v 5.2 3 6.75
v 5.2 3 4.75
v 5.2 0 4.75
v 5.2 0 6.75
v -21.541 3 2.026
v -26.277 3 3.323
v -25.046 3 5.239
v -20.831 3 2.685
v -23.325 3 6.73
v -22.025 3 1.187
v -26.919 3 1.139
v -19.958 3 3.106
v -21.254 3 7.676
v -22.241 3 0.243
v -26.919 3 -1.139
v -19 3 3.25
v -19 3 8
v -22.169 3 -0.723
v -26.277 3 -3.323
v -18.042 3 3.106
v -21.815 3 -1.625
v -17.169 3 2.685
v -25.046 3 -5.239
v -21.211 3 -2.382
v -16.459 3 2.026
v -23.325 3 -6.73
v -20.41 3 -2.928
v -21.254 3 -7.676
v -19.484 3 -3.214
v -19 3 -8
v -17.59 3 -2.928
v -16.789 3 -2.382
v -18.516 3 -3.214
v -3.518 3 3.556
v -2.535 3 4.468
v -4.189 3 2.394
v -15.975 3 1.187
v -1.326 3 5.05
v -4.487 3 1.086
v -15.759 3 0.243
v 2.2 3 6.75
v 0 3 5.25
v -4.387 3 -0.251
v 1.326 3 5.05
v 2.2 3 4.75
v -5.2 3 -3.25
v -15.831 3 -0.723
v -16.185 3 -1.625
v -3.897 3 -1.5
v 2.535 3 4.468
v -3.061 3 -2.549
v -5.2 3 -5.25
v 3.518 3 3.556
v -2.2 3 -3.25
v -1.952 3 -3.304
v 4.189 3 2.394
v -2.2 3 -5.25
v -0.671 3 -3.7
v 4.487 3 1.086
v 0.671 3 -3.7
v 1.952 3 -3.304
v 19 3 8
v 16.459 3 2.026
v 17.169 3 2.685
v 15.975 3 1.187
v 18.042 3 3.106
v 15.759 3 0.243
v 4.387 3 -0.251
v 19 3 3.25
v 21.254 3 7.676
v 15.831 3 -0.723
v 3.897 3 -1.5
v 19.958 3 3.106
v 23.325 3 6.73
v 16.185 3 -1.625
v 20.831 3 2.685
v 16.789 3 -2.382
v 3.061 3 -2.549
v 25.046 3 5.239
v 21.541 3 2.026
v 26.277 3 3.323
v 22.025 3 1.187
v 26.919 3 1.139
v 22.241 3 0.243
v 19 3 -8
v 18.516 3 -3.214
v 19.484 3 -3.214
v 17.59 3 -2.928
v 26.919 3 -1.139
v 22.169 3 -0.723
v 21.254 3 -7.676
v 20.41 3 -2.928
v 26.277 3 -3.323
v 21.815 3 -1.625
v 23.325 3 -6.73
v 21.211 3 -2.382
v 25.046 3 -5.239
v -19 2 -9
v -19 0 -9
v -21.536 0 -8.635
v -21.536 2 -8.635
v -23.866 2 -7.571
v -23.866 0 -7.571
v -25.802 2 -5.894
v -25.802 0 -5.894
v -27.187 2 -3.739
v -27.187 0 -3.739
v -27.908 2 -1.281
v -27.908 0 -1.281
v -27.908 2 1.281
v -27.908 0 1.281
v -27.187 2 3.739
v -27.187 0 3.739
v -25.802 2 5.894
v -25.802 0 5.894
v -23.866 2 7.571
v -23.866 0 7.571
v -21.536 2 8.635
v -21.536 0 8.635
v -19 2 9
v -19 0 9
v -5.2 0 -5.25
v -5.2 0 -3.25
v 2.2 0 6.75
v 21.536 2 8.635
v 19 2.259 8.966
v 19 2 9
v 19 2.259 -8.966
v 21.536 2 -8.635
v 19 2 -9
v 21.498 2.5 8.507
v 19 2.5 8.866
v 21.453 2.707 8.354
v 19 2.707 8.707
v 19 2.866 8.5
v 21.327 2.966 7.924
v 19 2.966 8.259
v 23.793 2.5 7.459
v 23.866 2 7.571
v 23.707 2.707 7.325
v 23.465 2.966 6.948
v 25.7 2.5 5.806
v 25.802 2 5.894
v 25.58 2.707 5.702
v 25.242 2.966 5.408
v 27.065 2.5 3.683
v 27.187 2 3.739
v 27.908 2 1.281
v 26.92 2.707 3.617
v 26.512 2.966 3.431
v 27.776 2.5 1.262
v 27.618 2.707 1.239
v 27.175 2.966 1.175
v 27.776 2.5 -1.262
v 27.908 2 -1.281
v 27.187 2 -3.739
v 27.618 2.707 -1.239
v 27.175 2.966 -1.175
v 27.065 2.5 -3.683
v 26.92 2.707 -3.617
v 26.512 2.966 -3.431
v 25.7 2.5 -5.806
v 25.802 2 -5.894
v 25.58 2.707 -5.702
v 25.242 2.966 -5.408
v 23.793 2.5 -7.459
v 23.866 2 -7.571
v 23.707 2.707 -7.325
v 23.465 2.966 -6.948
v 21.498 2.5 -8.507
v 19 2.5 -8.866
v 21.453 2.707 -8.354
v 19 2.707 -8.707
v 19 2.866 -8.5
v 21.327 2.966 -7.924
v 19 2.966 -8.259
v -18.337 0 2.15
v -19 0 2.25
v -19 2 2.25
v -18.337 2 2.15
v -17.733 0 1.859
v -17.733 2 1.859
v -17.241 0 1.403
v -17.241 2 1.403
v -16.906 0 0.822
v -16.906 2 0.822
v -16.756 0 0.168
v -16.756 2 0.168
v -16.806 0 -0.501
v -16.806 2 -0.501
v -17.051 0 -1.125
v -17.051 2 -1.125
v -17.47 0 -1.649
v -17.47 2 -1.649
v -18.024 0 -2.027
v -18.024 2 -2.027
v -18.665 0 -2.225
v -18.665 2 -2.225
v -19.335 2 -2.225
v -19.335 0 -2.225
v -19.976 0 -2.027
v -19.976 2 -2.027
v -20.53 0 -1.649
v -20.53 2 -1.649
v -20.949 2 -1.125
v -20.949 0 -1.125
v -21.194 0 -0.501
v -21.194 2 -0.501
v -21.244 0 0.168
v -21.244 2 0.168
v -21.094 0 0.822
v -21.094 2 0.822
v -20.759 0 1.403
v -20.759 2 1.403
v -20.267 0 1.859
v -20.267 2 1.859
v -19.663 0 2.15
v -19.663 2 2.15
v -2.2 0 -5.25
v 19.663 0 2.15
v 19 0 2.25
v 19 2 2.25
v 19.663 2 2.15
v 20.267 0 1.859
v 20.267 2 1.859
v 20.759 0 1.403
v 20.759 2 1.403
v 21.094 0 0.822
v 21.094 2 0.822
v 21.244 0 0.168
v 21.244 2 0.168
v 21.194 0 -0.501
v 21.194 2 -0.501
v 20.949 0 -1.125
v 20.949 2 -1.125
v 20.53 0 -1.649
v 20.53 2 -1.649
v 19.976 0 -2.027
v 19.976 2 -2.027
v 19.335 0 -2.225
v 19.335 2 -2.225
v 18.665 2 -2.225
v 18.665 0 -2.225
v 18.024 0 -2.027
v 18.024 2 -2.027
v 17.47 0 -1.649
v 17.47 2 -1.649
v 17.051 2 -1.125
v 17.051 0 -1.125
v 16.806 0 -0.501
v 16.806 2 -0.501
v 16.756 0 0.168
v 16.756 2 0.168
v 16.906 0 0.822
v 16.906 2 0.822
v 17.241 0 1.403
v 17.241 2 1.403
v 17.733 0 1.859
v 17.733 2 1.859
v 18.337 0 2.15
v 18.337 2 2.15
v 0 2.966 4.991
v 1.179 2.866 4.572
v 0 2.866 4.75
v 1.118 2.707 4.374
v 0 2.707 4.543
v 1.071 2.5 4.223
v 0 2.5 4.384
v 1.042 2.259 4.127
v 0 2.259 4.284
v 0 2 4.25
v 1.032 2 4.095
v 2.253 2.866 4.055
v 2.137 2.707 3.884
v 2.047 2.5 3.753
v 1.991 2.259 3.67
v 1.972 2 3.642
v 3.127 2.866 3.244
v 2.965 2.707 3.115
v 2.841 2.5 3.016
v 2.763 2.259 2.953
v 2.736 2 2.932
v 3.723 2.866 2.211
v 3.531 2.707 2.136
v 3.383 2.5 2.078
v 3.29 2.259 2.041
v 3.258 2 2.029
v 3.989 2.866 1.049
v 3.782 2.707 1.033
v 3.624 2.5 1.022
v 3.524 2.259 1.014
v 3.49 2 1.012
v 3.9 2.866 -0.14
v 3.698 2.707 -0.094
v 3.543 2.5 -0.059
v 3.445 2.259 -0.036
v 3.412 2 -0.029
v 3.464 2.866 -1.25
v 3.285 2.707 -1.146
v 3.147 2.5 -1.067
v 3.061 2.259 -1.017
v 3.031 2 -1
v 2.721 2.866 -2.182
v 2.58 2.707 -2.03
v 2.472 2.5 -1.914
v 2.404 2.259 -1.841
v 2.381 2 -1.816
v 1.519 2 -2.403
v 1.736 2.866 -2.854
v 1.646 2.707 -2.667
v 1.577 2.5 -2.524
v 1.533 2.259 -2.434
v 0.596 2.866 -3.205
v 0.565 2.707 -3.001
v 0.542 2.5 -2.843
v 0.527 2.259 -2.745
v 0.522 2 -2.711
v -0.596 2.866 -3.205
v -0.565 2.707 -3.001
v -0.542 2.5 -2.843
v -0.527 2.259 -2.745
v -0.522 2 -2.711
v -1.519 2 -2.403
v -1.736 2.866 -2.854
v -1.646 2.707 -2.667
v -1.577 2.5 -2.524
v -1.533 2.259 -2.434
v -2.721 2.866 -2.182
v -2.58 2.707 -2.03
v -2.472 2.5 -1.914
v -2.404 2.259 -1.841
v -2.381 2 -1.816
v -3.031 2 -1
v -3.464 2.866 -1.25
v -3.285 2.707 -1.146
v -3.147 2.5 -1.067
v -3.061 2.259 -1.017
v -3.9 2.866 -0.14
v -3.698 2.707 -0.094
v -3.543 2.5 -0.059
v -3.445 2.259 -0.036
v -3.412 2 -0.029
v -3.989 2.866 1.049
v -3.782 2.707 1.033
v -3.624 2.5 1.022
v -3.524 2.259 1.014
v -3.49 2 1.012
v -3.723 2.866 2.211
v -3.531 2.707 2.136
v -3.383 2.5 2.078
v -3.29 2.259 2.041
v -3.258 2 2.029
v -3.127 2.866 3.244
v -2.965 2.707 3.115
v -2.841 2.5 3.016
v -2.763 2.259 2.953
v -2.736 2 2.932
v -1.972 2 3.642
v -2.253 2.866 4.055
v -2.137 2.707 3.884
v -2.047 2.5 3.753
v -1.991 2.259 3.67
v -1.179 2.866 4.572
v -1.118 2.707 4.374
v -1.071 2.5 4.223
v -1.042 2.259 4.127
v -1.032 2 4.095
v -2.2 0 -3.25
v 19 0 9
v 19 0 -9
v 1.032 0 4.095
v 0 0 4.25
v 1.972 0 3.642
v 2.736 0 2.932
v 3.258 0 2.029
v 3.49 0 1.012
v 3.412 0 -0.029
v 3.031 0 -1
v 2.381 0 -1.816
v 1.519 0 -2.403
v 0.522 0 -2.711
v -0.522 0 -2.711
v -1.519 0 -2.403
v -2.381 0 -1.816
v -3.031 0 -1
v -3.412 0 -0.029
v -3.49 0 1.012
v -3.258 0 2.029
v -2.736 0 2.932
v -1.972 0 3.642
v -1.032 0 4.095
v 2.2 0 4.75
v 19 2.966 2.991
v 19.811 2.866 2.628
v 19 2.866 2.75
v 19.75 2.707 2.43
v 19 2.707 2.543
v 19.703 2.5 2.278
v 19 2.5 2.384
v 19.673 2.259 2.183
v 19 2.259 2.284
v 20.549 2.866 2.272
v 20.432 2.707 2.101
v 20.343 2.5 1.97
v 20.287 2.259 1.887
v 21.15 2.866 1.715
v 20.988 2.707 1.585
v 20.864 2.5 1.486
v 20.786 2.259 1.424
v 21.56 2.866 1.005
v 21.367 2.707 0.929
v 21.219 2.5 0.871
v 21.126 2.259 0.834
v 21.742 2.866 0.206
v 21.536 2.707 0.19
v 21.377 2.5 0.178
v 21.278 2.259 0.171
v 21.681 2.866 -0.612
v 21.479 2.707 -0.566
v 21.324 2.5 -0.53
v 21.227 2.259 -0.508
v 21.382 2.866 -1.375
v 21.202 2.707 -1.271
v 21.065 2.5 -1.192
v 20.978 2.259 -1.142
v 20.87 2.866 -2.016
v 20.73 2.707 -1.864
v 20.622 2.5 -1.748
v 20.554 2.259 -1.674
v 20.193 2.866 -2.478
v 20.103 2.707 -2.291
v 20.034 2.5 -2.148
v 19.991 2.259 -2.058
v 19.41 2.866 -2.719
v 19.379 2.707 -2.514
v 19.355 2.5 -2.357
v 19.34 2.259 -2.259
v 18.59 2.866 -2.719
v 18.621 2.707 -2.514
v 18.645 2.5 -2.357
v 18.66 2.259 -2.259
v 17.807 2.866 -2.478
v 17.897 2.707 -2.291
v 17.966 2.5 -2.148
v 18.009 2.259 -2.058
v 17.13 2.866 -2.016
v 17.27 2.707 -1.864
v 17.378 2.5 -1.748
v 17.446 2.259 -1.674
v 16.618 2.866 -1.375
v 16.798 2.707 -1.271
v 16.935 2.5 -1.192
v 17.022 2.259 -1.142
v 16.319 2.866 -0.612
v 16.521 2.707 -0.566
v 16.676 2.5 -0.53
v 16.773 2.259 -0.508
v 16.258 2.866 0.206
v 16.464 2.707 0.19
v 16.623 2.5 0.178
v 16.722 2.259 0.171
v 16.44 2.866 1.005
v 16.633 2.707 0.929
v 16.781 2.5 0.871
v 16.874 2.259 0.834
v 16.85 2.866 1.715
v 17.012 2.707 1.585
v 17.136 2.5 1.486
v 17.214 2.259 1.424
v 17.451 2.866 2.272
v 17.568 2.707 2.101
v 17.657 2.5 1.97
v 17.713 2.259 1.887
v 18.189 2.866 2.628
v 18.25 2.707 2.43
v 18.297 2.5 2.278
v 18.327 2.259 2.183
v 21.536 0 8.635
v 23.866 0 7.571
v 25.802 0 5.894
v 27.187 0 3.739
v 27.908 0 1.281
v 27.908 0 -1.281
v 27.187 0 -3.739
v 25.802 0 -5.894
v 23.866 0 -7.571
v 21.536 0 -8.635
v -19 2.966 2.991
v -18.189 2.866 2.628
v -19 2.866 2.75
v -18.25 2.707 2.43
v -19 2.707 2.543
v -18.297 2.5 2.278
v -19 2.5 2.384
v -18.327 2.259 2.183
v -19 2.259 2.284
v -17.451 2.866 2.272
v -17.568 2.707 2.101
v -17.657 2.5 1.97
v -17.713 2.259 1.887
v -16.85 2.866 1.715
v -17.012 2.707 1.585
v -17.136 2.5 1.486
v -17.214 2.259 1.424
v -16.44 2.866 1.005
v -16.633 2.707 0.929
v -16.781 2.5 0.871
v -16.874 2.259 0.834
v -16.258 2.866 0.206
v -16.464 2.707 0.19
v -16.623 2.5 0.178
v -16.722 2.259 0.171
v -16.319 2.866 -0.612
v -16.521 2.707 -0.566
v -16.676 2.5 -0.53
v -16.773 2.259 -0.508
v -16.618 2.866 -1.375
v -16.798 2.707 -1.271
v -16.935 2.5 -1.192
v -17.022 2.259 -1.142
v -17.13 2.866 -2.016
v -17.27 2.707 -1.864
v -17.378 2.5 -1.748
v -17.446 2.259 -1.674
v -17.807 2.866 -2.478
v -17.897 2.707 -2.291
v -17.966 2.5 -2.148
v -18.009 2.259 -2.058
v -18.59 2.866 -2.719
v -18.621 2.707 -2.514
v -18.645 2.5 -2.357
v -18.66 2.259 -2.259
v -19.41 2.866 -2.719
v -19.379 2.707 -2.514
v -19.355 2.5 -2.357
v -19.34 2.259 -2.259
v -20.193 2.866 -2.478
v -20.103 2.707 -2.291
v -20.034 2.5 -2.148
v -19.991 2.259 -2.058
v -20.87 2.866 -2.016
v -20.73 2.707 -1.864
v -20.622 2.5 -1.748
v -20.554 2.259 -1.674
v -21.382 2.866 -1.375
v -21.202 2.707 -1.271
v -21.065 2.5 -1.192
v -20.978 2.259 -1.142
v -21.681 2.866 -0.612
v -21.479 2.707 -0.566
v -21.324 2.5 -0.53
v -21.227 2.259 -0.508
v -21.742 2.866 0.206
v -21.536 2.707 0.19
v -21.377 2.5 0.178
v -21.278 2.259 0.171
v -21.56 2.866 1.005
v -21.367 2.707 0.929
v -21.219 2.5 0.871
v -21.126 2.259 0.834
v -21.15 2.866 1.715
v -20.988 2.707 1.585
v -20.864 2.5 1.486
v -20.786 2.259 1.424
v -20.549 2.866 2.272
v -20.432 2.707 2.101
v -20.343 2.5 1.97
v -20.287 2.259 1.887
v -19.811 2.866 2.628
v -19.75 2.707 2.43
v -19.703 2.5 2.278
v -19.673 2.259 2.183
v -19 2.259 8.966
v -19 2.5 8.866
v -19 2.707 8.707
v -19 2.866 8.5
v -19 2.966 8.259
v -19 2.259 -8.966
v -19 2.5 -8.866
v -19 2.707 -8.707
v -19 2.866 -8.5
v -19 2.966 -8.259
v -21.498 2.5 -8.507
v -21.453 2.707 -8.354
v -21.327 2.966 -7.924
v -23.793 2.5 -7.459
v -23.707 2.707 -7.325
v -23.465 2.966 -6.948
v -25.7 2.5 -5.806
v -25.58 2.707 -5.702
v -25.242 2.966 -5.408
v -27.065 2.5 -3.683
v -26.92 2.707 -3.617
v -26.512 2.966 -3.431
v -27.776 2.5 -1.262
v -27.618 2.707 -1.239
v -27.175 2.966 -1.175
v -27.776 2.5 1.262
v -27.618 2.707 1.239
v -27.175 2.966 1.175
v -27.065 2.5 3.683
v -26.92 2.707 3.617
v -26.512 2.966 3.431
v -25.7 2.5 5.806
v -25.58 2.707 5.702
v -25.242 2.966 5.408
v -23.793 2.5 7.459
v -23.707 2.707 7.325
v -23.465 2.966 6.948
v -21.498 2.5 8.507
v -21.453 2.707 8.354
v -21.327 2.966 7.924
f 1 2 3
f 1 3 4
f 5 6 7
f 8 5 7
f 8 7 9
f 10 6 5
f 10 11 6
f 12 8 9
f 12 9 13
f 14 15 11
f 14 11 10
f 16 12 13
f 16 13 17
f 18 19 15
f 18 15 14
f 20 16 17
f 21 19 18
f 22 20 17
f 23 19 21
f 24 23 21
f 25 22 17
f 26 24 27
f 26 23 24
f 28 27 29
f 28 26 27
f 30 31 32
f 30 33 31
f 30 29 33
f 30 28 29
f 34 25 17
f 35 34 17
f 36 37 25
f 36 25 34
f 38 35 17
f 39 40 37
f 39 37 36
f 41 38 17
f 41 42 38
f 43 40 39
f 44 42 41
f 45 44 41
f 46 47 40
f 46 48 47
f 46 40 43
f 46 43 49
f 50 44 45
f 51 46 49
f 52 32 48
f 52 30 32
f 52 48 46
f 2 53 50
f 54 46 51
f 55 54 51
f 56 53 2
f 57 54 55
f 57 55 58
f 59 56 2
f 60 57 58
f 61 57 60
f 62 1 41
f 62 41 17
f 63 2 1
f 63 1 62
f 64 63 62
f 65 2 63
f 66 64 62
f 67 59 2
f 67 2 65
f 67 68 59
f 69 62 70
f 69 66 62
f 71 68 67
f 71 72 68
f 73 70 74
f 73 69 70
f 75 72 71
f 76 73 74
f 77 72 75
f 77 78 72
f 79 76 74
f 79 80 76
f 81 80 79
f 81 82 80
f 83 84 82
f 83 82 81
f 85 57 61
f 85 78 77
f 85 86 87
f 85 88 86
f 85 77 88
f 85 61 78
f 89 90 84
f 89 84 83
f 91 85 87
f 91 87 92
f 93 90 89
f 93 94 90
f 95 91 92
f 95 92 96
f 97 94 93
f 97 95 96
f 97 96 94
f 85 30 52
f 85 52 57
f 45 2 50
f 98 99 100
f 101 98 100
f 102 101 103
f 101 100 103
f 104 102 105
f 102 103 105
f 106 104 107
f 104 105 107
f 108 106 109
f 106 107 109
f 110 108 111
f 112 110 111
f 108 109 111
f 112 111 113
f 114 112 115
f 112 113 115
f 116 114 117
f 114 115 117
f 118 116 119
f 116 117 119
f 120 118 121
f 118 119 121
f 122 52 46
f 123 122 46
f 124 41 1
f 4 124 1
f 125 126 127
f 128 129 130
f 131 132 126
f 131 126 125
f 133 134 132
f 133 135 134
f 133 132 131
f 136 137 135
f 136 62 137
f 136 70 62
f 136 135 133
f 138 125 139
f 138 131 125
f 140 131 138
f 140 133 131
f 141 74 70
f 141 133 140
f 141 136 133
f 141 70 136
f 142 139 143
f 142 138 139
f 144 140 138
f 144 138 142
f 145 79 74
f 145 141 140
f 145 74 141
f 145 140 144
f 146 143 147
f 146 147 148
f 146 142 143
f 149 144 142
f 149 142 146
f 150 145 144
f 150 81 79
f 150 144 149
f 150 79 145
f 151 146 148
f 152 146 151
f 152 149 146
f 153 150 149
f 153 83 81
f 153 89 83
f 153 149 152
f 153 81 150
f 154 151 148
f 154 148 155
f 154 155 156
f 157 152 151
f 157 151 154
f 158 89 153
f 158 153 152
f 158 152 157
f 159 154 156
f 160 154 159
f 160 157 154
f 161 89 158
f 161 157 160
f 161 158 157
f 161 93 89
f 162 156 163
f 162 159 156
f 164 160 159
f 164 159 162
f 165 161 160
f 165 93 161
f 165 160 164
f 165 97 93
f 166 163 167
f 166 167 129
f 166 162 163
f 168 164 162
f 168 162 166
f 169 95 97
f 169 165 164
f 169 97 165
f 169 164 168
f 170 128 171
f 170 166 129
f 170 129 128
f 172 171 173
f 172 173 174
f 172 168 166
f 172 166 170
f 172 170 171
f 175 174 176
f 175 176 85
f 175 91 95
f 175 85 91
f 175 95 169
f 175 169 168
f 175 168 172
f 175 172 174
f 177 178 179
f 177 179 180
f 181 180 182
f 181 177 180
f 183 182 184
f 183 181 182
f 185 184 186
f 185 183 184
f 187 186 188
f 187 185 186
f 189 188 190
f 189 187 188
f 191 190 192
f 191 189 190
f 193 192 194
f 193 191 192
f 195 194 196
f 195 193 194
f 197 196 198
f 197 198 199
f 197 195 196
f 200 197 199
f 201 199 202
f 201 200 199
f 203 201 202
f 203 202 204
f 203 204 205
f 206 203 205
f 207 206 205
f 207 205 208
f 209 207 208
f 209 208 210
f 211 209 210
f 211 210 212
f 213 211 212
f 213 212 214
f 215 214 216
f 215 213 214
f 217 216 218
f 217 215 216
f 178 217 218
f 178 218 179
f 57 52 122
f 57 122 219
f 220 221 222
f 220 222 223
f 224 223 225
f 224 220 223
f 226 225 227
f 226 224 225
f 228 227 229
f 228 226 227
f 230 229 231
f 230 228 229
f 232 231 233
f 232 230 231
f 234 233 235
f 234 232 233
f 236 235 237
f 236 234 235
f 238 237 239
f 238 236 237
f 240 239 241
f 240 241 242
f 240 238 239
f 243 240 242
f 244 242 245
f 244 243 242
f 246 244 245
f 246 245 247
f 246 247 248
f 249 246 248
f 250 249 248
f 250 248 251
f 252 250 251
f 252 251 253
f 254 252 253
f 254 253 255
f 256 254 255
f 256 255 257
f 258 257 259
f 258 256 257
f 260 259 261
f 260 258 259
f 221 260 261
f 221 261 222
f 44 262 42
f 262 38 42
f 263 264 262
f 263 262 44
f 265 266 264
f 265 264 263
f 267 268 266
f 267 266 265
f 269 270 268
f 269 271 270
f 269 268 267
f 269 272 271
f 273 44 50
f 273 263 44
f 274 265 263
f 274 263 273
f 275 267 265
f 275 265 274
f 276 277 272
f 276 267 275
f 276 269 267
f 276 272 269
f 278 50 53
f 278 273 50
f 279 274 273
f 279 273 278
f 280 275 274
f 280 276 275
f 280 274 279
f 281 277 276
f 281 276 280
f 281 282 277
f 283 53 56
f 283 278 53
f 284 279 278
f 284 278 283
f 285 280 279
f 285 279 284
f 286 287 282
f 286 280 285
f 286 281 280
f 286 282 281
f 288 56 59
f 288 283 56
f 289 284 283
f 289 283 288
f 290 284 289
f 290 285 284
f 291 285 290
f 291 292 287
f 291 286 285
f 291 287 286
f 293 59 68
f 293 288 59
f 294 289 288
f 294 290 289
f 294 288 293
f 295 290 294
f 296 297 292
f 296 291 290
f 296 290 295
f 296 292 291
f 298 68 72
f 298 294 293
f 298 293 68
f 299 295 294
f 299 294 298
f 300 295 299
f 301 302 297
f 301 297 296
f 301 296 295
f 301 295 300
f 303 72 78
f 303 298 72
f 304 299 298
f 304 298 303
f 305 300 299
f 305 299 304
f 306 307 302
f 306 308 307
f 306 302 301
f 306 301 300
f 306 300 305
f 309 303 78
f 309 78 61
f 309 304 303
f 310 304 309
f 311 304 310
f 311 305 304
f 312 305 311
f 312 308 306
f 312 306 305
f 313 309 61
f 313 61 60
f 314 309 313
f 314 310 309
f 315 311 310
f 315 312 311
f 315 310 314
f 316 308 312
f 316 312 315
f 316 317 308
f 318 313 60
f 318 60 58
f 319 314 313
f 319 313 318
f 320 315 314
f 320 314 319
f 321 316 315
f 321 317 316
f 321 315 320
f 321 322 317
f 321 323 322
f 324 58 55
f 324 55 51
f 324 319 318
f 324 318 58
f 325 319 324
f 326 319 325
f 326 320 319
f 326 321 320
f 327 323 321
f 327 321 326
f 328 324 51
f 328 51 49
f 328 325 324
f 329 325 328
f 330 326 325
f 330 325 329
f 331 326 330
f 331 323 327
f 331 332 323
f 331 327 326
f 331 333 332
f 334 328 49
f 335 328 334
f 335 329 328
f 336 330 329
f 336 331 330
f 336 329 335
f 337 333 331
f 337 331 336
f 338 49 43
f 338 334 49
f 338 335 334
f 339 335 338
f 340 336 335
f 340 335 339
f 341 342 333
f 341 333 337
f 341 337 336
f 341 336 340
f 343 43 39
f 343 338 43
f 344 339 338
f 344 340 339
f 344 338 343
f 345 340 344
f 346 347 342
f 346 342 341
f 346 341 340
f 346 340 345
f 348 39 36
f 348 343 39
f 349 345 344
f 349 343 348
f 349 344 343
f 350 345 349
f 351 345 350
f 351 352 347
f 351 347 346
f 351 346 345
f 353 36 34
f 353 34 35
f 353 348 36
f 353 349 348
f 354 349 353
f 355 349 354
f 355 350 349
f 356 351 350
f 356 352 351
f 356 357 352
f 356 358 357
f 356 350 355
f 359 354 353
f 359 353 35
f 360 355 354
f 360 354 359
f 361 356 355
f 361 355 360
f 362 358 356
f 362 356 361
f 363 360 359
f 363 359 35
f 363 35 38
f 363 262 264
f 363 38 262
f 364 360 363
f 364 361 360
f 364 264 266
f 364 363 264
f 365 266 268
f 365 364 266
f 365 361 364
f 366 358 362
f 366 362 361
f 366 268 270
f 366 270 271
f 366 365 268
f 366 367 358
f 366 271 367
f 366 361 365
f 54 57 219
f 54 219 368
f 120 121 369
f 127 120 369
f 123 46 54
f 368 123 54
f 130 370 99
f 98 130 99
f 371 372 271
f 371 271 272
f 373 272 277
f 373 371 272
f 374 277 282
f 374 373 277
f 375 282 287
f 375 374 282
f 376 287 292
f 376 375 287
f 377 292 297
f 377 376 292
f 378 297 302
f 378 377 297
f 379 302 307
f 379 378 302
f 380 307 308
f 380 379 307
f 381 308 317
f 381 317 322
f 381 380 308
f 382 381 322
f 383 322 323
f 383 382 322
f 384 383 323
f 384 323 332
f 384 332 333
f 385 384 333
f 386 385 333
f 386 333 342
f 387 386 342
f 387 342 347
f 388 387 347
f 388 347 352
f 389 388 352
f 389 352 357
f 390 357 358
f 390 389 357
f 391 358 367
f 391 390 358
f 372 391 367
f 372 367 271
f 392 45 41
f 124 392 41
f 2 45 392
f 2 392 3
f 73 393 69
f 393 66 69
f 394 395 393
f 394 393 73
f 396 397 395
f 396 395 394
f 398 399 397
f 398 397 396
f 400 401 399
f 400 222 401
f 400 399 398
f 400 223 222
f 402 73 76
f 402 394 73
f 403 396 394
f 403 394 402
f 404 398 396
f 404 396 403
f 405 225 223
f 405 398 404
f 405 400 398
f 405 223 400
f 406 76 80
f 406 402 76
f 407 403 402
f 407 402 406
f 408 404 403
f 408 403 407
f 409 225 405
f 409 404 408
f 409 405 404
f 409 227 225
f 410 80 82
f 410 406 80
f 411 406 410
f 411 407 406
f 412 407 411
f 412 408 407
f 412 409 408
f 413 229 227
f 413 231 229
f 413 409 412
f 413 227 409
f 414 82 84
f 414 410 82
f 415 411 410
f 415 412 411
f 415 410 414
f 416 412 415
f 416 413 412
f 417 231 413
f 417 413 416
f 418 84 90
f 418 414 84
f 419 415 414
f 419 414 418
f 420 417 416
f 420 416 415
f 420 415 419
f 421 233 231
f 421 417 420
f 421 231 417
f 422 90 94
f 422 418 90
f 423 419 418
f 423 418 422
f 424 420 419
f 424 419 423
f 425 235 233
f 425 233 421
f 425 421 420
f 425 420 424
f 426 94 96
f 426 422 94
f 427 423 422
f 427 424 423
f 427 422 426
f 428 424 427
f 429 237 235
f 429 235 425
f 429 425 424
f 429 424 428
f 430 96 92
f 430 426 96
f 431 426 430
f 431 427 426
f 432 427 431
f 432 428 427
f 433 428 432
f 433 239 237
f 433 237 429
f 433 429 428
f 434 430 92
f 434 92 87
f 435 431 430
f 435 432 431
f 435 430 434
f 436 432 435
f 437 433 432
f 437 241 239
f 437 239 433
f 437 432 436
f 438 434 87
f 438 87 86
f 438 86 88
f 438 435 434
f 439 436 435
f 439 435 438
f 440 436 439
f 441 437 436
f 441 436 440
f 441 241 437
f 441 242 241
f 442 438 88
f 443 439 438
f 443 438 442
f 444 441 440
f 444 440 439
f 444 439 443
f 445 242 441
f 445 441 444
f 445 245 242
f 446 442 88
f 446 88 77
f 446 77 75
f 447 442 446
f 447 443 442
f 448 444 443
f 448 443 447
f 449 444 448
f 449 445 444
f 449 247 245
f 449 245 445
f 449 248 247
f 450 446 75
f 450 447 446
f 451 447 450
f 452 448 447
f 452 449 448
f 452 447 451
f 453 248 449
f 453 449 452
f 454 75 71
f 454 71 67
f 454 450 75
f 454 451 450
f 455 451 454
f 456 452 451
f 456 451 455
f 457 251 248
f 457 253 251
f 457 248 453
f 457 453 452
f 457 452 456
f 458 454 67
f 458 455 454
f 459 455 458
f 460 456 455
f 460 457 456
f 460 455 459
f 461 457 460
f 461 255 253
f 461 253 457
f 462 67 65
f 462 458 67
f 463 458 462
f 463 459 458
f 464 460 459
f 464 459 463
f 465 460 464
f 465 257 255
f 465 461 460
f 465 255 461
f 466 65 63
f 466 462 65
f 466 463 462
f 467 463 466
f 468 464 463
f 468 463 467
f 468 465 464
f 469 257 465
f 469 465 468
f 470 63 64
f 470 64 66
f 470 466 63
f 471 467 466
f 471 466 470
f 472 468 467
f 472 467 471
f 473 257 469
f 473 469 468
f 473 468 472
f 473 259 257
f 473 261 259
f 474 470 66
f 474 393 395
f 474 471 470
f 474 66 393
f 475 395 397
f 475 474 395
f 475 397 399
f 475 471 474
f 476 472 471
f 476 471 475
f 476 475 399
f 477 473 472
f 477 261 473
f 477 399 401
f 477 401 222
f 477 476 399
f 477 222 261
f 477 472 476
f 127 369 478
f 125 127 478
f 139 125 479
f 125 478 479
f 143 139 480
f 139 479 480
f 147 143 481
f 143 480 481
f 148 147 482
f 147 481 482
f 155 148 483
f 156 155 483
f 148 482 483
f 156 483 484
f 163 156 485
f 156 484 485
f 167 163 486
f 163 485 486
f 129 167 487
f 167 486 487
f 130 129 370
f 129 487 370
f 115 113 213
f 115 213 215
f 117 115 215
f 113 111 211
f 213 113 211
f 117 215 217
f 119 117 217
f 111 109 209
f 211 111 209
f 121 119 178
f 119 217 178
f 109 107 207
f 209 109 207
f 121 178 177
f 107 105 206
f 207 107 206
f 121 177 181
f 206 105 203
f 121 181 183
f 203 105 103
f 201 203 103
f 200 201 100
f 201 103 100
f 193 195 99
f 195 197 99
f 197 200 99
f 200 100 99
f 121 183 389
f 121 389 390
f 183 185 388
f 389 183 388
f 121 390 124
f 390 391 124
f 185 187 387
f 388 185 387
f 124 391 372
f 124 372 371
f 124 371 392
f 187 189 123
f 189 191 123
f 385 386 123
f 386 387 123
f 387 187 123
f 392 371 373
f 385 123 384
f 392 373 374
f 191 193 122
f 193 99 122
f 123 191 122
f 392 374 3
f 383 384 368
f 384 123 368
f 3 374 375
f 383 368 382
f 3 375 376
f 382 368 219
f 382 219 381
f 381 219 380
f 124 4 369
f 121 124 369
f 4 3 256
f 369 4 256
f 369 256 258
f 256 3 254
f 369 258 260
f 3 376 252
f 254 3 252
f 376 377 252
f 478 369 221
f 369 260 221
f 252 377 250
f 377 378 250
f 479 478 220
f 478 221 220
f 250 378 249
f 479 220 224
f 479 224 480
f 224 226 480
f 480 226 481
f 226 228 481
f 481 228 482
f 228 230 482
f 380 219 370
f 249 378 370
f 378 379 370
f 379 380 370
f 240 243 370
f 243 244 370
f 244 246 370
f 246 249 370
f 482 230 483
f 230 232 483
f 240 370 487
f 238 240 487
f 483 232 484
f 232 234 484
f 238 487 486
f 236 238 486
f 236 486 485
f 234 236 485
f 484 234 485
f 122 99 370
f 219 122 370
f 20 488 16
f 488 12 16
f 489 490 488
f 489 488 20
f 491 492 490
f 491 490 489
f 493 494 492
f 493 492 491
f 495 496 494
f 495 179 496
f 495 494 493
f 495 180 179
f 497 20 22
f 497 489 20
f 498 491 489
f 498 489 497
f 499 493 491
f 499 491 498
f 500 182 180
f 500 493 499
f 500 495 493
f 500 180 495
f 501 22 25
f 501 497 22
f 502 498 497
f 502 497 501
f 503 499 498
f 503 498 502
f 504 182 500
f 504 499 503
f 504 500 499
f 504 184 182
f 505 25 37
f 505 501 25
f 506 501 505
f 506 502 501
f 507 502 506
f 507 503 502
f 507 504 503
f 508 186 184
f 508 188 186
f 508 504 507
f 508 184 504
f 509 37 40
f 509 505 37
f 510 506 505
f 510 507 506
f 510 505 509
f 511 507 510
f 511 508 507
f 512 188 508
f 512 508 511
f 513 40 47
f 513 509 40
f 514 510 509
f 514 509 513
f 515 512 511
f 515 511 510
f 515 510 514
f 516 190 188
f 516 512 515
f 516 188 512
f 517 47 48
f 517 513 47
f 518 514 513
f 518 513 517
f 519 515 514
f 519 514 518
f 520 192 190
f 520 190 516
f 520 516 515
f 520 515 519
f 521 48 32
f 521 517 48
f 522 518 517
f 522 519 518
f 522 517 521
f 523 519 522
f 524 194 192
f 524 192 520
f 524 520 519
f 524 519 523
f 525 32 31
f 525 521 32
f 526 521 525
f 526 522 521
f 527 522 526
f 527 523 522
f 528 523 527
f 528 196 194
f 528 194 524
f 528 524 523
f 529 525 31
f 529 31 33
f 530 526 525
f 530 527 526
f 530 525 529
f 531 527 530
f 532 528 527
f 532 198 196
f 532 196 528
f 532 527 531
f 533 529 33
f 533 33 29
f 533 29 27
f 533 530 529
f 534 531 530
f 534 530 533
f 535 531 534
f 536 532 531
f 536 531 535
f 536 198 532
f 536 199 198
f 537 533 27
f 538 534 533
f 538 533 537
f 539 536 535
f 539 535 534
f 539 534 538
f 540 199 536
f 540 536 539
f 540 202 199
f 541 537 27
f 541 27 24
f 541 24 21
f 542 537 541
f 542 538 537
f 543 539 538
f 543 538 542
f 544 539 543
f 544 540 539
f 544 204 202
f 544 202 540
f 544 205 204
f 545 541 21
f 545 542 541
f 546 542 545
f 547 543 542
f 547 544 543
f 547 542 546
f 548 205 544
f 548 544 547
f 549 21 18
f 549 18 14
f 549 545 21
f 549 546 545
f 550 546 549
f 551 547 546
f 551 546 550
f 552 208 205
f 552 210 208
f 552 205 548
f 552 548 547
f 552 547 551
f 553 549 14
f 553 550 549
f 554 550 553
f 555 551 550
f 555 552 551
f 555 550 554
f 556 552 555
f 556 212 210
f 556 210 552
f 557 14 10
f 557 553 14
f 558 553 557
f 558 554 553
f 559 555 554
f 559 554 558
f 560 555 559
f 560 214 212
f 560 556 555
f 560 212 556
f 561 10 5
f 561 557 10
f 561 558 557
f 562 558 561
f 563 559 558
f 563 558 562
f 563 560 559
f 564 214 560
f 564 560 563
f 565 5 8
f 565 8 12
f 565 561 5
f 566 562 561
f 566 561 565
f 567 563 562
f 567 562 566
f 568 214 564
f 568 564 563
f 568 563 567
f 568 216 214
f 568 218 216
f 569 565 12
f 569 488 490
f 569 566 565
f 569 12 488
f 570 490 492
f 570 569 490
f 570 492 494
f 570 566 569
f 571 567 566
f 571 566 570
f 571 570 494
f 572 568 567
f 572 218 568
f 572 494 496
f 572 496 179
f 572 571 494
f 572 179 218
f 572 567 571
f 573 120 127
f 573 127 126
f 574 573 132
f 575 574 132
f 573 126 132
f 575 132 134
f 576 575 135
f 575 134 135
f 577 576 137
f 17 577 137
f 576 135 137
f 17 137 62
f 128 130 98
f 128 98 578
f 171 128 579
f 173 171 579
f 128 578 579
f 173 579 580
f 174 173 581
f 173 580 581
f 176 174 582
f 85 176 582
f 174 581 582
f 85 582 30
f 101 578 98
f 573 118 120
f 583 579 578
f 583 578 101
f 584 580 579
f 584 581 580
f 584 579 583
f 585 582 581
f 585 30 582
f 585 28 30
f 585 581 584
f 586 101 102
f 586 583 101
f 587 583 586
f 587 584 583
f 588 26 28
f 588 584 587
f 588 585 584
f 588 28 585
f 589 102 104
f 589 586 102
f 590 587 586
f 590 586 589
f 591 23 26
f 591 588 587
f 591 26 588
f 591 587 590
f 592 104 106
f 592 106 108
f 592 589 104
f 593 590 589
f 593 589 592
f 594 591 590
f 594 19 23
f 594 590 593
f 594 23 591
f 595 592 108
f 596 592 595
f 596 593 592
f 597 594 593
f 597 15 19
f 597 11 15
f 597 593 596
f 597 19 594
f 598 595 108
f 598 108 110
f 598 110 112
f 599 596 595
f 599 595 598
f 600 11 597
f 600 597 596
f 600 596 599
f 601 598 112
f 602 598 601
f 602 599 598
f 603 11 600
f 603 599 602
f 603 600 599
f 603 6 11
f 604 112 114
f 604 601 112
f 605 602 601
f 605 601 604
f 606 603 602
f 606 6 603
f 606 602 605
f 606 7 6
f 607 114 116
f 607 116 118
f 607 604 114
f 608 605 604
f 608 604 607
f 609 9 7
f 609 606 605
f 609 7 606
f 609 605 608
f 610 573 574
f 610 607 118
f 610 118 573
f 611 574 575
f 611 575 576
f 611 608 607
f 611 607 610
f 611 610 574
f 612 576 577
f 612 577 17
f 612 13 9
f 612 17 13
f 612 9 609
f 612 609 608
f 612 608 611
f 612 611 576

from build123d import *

# Parameters (mm, degrees)
SKETCH1_R               = 2.25
SKETCH1_R_2             = 3.5
BOSS_EXTRUDE1_DEPTH     = 3
CUT_EXTRUDE1_DEPTH      = 30.563490998
CUT_EXTRUDE1_DEPTH_BACK = 30.563490998
SKETCH2_W               = 3
SKETCH2_H               = 2
FILLET1_R               = 1


with BuildPart() as part:
    # Sketch1 → Boss-Extrude1 (new body)
    with BuildSketch(Plane(origin=(0, 0, 0), x_dir=(1, 0, 0), z_dir=(0, 1, 0))):
        with BuildLine():
            Line((19, 9), (-19, 9))
            ThreePointArc((-19, 9), (-28, 0), (-19, -9))
            Line((-19, -9), (19, -9))
            ThreePointArc((19, -9), (28, 0), (19, 9))
        make_face()
        with Locations(Location((-19, 0, 0), (0, 0, 270))):
            Circle(SKETCH1_R, mode=Mode.SUBTRACT)
        with Locations(Location((19, 0, 0), (0, 0, 270))):
            Circle(SKETCH1_R, mode=Mode.SUBTRACT)
        with Locations(Location((0, -0.75, 0), (0, 0, 270))):
            Circle(SKETCH1_R_2, mode=Mode.SUBTRACT)
    extrude(amount=BOSS_EXTRUDE1_DEPTH)

    # Sketch2 → Cut-Extrude1 (cut, two sides: drawn at the far end of the back side and taken through both)
    with BuildSketch(Plane.XZ.offset(-CUT_EXTRUDE1_DEPTH_BACK)):
        with Locations((3.7, 5.75)):
            Rectangle(SKETCH2_W, SKETCH2_H)
        with Locations((-3.7, -4.25)):
            Rectangle(SKETCH2_W, SKETCH2_H)
    extrude(amount=CUT_EXTRUDE1_DEPTH + CUT_EXTRUDE1_DEPTH_BACK, mode=Mode.SUBTRACT)

    # Fillet1
    fillet1_edges = [part.edges().sort_by_distance(p)[0] for p in [
        (-19, 3, -2.25),
        (28, 3, 0),
        (19, 3, -2.25),
        (0, 3, -9),
        (0, 3, -2.75),
        (-28, 3, 0),
        (0, 3, 9),
    ]]
    fillet(fillet1_edges, radius=FILLET1_R)


solid = part.part
